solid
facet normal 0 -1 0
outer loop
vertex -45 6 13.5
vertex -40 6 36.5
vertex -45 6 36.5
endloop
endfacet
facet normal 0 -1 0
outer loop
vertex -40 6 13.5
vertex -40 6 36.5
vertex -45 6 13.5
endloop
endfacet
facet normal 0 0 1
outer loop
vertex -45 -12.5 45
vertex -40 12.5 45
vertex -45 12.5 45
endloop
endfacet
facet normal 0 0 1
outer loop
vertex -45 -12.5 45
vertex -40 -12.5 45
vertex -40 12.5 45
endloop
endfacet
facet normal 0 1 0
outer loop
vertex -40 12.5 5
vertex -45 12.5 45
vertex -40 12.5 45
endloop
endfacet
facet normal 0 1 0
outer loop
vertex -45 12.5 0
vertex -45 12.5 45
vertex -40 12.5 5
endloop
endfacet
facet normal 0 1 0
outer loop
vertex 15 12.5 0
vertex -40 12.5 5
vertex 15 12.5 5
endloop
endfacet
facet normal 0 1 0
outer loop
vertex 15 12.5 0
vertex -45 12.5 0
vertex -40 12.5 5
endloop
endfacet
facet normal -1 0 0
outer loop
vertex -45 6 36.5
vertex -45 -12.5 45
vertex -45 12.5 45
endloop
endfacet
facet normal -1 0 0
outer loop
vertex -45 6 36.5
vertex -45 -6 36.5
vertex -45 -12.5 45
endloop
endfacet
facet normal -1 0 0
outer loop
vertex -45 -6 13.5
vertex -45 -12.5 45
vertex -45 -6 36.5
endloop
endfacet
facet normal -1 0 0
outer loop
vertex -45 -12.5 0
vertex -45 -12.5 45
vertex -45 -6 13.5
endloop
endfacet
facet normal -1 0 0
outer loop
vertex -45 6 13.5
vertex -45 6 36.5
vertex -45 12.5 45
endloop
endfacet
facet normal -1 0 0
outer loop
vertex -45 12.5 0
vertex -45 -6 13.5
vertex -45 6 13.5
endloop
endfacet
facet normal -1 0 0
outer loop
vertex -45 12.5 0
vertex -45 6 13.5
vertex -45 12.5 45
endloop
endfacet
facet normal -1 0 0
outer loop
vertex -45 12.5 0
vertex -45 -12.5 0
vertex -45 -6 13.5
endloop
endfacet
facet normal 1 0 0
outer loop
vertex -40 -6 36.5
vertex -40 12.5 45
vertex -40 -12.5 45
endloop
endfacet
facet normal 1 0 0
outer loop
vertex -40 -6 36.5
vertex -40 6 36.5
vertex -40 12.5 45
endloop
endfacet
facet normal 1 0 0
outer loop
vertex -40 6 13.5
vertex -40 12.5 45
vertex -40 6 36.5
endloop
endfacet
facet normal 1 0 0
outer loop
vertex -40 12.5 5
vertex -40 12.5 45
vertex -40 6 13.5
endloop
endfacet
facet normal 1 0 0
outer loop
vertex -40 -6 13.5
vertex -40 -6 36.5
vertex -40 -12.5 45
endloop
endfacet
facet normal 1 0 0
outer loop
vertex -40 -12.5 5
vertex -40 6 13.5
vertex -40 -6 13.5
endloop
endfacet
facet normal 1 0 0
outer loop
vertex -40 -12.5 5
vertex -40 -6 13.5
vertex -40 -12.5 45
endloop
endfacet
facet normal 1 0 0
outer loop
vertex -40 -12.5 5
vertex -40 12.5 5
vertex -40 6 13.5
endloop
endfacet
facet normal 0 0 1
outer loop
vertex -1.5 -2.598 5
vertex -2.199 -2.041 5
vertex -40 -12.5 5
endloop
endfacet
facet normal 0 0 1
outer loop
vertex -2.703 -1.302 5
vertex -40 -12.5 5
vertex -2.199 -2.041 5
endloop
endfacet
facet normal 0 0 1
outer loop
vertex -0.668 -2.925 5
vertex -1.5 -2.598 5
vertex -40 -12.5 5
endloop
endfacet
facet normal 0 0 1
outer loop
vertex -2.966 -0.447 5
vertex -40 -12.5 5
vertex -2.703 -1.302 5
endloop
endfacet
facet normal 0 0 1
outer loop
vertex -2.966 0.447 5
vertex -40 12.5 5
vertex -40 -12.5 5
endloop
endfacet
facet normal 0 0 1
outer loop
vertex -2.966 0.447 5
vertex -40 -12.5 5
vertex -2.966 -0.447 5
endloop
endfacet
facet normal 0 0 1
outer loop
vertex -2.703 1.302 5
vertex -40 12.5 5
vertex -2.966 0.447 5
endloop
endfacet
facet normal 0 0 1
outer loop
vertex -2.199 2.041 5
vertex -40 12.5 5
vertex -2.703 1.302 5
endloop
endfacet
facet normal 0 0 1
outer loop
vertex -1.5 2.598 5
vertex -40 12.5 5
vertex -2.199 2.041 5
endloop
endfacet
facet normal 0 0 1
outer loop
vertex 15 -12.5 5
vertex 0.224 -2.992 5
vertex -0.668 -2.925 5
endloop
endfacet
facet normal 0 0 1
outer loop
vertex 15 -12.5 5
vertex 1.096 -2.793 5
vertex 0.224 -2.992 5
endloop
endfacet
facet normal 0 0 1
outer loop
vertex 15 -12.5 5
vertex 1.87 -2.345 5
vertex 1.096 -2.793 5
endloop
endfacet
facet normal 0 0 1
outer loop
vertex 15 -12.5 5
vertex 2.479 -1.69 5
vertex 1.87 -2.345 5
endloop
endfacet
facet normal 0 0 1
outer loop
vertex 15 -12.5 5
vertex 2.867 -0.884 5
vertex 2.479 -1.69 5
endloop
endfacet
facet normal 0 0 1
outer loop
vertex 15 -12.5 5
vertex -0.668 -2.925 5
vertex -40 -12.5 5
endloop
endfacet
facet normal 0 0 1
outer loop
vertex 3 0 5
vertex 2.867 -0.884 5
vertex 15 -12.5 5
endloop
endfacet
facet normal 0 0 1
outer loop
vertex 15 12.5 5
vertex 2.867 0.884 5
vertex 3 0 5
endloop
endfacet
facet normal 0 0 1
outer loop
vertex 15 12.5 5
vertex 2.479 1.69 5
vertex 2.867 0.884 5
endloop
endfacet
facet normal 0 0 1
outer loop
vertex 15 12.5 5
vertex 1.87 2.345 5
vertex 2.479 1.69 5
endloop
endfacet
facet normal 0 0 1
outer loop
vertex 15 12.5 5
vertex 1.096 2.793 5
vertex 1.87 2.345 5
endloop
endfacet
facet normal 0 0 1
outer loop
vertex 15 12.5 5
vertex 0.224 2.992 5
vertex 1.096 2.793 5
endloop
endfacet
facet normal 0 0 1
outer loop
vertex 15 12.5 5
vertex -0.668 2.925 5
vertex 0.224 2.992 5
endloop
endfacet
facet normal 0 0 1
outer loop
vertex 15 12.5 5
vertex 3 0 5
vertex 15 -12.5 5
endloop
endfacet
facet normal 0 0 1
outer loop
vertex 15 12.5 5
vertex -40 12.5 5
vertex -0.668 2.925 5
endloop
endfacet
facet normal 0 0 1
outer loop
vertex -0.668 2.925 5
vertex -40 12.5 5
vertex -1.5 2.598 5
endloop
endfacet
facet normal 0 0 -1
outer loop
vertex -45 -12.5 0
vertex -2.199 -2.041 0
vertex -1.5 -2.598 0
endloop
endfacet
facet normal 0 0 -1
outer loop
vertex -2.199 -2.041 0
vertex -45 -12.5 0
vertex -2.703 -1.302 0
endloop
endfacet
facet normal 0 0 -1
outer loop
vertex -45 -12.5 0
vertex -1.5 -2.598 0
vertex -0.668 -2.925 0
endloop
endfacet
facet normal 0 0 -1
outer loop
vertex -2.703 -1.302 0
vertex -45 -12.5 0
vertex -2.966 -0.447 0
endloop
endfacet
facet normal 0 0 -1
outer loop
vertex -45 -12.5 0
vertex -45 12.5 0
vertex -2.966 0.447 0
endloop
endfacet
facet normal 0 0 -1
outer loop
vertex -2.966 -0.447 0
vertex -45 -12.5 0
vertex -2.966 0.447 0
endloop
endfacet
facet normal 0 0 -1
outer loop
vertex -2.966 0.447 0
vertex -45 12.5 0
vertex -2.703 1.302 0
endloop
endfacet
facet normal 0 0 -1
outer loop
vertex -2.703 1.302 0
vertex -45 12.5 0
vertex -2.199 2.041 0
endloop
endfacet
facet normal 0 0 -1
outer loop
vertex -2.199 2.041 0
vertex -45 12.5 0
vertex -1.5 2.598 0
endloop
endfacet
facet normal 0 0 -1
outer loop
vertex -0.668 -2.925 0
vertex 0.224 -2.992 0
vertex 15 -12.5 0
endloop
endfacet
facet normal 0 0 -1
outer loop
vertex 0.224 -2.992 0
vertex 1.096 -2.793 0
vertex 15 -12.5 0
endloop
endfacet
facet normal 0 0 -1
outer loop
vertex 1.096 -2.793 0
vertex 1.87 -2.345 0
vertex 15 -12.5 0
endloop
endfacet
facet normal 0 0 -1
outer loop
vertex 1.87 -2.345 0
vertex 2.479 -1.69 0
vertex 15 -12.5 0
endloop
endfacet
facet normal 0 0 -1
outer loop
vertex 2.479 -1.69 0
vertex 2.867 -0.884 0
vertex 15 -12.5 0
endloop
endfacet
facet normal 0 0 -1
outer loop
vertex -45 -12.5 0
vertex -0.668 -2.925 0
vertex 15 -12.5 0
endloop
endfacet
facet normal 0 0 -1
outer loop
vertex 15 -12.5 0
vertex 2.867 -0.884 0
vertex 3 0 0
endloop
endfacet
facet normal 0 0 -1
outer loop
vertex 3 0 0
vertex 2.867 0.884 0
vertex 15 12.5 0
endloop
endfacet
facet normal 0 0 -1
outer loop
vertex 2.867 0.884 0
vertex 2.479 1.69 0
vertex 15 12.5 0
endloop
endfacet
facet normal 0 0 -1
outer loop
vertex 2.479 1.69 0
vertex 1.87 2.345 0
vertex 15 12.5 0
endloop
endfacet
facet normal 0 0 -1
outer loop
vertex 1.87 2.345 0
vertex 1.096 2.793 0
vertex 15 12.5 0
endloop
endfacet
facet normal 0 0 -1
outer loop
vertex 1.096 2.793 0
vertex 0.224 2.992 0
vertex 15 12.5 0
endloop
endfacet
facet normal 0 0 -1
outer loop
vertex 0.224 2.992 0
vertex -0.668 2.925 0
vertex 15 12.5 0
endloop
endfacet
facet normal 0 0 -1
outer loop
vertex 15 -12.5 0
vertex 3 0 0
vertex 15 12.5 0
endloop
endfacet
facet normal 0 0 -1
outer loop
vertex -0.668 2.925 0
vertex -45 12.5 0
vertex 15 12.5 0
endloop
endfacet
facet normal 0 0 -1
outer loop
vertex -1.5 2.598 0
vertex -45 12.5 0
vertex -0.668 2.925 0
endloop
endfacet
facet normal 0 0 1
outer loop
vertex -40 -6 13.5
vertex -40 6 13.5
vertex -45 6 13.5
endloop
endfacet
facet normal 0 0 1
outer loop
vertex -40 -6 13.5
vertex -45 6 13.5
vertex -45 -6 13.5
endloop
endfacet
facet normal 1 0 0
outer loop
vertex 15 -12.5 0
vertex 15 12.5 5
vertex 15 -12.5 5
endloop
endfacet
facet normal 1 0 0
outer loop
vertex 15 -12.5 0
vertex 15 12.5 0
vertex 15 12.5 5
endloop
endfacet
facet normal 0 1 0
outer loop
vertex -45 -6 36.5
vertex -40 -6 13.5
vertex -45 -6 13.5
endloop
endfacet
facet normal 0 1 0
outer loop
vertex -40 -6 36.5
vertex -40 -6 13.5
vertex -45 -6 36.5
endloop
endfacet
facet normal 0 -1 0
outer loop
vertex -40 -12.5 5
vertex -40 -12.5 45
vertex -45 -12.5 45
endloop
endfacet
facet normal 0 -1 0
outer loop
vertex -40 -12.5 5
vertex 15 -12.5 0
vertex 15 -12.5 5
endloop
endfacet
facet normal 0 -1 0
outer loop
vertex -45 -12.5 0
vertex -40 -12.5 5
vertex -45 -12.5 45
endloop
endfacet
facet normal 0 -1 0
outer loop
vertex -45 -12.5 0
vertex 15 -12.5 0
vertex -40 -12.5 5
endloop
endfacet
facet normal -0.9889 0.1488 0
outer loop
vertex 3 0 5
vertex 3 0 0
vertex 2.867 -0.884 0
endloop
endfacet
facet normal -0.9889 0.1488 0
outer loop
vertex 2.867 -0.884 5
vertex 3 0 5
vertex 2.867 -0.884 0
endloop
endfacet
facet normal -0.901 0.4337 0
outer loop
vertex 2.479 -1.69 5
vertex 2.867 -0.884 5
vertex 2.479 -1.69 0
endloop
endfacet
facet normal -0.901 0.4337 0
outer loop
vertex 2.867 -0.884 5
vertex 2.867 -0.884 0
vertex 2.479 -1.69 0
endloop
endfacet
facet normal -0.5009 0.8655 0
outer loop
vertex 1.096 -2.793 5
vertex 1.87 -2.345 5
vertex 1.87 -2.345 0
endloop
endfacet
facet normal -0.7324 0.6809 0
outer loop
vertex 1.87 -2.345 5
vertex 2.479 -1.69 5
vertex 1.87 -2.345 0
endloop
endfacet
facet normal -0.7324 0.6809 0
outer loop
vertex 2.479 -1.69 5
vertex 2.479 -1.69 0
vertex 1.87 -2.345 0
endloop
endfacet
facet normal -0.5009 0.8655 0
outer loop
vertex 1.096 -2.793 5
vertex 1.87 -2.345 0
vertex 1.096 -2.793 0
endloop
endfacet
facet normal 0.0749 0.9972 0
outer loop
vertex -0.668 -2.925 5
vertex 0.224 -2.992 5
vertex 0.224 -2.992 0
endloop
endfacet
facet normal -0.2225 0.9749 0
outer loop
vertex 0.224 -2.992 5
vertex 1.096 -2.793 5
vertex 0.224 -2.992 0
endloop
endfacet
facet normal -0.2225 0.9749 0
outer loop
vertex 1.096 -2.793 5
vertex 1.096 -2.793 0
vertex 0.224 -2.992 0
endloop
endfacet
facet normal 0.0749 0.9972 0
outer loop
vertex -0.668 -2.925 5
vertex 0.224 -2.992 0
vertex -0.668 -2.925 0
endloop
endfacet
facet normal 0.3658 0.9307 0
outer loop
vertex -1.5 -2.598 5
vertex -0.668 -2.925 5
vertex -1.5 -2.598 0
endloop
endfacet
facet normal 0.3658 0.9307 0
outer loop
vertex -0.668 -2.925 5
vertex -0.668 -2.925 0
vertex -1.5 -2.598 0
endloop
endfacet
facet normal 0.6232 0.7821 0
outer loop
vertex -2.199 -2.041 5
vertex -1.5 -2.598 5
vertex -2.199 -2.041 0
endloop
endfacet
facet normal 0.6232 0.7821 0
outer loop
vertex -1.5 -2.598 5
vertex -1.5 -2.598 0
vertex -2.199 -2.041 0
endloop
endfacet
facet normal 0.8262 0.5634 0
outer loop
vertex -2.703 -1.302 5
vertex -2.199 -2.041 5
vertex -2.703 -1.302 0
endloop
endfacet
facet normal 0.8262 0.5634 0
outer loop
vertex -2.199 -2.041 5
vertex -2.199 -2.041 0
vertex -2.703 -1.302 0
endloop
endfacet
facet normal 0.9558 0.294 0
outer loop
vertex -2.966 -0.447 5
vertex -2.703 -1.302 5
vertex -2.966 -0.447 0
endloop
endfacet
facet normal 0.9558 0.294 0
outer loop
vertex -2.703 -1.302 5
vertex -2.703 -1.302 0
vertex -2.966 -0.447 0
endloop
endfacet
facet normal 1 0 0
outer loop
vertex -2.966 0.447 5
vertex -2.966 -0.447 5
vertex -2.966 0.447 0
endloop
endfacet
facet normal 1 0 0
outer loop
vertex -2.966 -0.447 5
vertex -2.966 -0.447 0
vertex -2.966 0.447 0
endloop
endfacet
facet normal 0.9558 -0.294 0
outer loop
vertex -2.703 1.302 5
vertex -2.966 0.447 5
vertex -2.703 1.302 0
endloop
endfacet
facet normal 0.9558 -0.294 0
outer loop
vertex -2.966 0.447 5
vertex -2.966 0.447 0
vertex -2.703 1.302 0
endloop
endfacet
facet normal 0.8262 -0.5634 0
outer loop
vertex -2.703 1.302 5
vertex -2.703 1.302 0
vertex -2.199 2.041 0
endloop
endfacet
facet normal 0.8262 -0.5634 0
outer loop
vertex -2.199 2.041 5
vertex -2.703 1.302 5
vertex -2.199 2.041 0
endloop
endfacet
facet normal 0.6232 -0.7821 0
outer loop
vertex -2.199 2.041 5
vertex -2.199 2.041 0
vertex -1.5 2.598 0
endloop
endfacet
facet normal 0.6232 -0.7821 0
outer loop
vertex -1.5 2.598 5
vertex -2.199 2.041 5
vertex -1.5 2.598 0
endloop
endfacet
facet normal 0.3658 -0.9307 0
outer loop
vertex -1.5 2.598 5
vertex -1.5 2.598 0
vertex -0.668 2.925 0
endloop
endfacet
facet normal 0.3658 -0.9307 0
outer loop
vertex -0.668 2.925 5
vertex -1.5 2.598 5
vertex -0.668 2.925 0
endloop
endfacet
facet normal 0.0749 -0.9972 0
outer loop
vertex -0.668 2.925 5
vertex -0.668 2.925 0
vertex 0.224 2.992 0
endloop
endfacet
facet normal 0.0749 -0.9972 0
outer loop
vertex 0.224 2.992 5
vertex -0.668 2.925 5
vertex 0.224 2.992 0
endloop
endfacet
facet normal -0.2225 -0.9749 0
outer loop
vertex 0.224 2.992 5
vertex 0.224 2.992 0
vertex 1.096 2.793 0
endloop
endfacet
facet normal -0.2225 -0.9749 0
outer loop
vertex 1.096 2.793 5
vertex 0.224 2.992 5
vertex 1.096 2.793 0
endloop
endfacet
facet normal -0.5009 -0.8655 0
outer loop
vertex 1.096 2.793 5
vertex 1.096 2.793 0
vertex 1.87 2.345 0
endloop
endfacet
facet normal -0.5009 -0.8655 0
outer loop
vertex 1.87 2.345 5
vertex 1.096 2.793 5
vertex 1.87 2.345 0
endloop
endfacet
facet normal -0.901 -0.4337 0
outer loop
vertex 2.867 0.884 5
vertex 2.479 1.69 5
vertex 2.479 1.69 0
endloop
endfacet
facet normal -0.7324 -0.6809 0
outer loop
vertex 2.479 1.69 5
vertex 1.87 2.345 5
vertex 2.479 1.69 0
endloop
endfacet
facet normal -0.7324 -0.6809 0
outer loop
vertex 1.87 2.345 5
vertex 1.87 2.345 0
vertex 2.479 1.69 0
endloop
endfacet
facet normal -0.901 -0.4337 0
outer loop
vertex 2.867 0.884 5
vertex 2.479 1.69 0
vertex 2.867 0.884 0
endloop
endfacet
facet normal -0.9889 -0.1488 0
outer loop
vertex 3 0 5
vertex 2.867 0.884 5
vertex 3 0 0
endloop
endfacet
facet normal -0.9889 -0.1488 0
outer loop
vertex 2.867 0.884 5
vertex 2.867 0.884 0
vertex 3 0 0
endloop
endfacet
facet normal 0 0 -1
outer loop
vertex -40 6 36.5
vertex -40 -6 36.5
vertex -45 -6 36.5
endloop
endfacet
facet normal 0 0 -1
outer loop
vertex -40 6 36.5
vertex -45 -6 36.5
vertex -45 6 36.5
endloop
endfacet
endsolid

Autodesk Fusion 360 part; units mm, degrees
sketch "Sketch1" plane through (0, 0, 0) normal (0, 0, 1) x (1, 0, 0)
  circle A0 centre (0, 0) radius 3
  line L0 (15, -12.5) -> (-45, -12.5)
  line L1 (-45, -12.5) -> (-45, 12.5)
  line L2 (-45, 12.5) -> (15, 12.5)
  line L3 (15, 12.5) -> (15, -12.5)
  dimension "d1" = 6
  dimension "d2" = 25
  dimension "d12" = 60
  dimension "d14" = 15
extrude "Extrude1" add sketch "Sketch1" along normal blind 5
sketch "Sketch2" plane through (0, 0, 5) normal (0, 0, 1) x (-1, 0, 0)
  circle A0 centre (0, 0) radius 3
  line L0 (-15, -12.5) -> (45, -12.5)
  line L1 (45, -12.5) -> (45, 12.5)
  line L2 (45, 12.5) -> (-15, 12.5)
  line L3 (-15, 12.5) -> (-15, -12.5)
  line L4 (45, -12.5) -> (40, -12.5)
  line L5 (40, -12.5) -> (40, 12.5)
  line L6 (40, 12.5) -> (45, 12.5)
  line L7 (45, 12.5) -> (45, -12.5)
  dimension "d5" = 5
extrude "Extrude2" add sketch "Sketch2" along normal blind 40 contours L0 L1 L2 L4 L5 L6 L7
sketch "Sketch3" plane through (-40, 0, 0) normal (1, 0, 0) x (0, 1, 0)
  line L0 (-12.5, 5) -> (12.5, 5)
  line L1 (12.5, 5) -> (12.5, 45)
  line L2 (12.5, 45) -> (-12.5, 45)
  line L3 (-12.5, 45) -> (-12.5, 5)
  line L4 (6, 13.5) -> (-6, 13.5)
  line L5 (-6, 13.5) -> (-6, 36.5)
  line L6 (-6, 36.5) -> (6, 36.5)
  line L7 (6, 36.5) -> (6, 13.5)
  line L8 (6, 13.5) -> (-6, 36.5) construction
  line L9 (-6, 13.5) -> (6, 36.5) construction
  point P0 (0, 25)
  dimension "d8" = 12
  dimension "d9" = 23
extrude "Extrude3" cut sketch "Sketch3" against normal blind 40 contours L4 L5 L6 L7
